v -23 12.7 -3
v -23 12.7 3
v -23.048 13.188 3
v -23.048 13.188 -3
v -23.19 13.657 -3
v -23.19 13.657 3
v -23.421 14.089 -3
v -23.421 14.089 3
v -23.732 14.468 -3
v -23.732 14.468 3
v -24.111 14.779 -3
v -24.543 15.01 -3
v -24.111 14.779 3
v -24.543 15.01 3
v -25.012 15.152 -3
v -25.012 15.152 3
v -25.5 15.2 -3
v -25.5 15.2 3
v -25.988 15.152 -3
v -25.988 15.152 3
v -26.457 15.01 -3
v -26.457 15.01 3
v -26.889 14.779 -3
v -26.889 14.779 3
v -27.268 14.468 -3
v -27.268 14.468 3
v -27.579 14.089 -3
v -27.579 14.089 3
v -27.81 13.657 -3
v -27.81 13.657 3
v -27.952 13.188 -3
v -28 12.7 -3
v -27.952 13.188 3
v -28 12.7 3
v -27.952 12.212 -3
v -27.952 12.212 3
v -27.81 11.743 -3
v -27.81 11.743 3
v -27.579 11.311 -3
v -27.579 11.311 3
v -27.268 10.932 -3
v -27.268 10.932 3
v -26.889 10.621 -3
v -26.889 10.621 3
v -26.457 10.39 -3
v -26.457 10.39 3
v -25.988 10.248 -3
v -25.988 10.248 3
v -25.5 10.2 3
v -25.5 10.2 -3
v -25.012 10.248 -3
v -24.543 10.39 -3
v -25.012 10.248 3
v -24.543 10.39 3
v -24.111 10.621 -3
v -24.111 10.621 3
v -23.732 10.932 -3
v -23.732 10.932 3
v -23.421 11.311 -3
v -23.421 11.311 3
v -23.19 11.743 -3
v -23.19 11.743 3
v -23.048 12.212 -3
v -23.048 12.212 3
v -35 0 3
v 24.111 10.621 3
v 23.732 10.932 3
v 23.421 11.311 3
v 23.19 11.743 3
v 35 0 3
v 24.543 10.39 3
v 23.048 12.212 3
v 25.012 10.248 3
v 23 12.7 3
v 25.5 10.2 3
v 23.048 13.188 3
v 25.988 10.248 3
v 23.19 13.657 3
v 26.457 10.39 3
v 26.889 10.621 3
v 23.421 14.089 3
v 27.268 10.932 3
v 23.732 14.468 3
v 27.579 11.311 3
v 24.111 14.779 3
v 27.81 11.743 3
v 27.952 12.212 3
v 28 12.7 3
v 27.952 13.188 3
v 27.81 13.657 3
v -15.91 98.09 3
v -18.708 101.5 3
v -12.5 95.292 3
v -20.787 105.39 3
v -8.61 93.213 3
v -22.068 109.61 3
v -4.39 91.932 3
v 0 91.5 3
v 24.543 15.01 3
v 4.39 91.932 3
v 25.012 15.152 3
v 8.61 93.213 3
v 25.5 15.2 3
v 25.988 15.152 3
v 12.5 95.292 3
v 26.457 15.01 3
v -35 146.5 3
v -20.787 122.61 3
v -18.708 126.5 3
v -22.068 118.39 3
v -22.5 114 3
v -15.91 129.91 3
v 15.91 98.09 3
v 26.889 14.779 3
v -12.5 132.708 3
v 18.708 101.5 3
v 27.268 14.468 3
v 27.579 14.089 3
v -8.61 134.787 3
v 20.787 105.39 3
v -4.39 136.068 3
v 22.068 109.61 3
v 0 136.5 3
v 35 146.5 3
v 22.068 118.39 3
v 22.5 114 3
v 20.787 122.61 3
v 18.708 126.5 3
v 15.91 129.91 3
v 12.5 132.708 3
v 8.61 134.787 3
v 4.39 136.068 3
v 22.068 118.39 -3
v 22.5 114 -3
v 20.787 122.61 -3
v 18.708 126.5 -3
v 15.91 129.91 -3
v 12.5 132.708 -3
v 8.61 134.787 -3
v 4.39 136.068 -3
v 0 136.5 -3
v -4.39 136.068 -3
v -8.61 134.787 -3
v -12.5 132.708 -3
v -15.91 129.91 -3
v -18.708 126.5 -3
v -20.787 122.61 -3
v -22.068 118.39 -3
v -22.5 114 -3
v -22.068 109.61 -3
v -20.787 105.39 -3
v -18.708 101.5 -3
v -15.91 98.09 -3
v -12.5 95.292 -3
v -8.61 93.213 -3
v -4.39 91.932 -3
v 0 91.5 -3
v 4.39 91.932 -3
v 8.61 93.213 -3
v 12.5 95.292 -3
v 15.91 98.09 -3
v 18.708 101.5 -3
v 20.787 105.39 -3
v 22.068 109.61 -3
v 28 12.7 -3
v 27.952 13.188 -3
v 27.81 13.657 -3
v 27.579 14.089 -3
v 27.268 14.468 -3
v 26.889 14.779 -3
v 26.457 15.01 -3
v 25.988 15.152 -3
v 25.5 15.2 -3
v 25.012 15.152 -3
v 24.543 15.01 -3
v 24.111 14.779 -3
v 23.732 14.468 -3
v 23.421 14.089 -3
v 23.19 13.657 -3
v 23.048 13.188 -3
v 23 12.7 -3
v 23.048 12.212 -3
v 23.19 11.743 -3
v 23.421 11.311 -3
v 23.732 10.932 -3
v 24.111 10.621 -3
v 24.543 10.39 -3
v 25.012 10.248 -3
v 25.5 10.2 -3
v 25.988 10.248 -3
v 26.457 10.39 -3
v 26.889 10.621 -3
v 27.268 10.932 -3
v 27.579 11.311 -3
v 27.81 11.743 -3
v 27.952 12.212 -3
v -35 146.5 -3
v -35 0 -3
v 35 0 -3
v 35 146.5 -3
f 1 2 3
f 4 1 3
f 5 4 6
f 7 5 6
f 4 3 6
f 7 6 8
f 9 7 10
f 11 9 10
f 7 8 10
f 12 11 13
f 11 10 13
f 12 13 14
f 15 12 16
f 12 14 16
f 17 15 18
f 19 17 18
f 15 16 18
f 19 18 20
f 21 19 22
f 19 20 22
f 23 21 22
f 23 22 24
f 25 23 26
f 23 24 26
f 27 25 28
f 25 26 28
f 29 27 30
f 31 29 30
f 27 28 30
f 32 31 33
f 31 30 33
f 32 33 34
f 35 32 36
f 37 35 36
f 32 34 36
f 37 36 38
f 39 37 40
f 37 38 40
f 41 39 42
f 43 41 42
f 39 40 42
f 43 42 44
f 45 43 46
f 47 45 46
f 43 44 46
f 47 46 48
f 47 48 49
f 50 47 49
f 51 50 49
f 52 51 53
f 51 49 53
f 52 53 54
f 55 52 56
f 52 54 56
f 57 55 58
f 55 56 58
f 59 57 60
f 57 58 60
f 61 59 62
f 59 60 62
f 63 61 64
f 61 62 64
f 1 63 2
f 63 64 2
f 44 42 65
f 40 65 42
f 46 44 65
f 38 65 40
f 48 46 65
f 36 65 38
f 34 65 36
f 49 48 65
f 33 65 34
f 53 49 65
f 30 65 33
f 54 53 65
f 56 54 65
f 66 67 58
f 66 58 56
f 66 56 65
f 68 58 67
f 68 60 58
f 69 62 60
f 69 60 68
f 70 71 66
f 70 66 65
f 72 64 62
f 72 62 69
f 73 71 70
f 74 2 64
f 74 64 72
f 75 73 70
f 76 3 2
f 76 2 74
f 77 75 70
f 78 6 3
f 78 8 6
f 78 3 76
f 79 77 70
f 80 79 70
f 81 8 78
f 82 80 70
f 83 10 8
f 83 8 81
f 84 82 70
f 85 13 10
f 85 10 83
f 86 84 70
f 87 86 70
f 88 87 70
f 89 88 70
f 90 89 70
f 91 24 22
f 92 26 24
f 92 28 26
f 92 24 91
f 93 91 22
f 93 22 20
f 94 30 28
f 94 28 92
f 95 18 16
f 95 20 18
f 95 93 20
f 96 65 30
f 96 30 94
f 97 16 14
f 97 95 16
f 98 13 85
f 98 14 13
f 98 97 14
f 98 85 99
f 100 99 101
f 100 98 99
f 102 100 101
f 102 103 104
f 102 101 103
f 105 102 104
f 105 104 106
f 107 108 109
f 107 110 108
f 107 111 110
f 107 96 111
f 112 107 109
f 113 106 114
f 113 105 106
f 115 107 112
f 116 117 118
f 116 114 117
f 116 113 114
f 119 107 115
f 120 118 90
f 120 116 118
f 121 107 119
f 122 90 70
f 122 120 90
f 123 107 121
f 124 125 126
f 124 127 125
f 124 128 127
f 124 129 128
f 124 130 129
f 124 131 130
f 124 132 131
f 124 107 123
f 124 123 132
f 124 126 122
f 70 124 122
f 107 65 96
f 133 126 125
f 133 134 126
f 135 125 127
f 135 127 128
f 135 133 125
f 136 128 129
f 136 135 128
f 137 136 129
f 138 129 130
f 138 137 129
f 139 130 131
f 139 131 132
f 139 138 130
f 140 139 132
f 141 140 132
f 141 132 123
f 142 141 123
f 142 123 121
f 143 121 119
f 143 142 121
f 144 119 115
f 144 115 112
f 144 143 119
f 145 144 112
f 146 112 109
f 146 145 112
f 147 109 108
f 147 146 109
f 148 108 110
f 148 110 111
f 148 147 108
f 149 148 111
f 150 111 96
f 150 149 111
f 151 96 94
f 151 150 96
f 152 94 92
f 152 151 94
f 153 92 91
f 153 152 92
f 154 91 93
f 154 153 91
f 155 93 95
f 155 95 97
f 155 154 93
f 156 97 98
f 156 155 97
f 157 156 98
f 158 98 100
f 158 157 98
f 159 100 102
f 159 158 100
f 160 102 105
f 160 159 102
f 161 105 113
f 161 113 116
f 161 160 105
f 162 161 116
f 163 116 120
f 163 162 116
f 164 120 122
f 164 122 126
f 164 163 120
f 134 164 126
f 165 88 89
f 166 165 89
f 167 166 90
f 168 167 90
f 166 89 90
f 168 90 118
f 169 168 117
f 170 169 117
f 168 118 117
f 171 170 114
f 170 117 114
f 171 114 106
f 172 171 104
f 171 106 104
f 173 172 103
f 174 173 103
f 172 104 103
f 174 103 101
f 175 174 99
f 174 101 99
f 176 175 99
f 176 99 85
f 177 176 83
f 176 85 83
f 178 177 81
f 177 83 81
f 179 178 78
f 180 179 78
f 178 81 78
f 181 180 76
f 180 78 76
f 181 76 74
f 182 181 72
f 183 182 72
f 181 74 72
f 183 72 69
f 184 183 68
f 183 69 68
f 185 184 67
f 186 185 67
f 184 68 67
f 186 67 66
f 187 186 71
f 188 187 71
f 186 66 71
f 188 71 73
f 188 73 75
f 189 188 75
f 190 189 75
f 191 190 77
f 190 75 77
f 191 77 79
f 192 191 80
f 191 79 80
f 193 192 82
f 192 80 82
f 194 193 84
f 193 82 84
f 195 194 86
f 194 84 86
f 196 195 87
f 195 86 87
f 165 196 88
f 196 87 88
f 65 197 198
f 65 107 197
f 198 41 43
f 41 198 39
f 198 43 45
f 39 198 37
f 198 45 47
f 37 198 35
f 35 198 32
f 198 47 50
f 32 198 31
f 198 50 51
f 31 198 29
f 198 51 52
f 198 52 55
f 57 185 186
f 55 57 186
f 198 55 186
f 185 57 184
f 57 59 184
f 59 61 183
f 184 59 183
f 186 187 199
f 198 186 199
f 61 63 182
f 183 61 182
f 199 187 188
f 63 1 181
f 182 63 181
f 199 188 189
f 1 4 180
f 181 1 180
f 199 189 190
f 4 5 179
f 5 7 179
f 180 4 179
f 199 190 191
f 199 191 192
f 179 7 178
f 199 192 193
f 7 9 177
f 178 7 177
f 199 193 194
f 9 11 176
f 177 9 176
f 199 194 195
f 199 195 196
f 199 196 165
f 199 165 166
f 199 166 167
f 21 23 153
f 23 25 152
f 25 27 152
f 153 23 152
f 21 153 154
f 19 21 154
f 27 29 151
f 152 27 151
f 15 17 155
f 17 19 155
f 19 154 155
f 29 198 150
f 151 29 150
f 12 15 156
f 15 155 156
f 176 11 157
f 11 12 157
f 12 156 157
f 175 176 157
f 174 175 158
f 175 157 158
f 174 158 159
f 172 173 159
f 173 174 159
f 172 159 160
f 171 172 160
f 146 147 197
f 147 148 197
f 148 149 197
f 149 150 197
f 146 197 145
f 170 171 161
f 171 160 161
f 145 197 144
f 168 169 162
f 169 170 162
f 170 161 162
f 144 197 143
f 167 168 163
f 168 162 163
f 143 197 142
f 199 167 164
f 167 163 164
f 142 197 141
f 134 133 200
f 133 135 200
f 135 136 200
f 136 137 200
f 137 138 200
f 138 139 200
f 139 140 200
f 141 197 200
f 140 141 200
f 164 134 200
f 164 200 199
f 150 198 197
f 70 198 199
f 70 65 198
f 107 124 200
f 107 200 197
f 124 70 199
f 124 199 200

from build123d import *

# Parameters (mm, degrees)
SKETCH2_R           = 22.5
BOSS_EXTRUDE1_DEPTH = 3
SKETCH3_R           = 2.5
CUT_EXTRUDE1_DEPTH  = 6


with BuildPart() as part:
    # Sketch2 → Boss-Extrude1 (new, symmetric)
    with BuildSketch(Plane.XY):
        Polygon((-35, 0), (35, 0), (35, 114), (35, 146.5), (-35, 146.5), (-35, 114), align=None)
        with Locations((0, 114)):
            Circle(SKETCH2_R, mode=Mode.SUBTRACT)
    extrude(amount=BOSS_EXTRUDE1_DEPTH, both=True)

    # Sketch3 → Cut-Extrude1 (cut)
    with BuildSketch(Plane.XY.offset(3)):
        with Locations((-25.5, 12.7)):
            Circle(SKETCH3_R)
        with Locations((25.5, 12.7)):
            Circle(SKETCH3_R)
    extrude(amount=-CUT_EXTRUDE1_DEPTH, mode=Mode.SUBTRACT)


solid = part.part
